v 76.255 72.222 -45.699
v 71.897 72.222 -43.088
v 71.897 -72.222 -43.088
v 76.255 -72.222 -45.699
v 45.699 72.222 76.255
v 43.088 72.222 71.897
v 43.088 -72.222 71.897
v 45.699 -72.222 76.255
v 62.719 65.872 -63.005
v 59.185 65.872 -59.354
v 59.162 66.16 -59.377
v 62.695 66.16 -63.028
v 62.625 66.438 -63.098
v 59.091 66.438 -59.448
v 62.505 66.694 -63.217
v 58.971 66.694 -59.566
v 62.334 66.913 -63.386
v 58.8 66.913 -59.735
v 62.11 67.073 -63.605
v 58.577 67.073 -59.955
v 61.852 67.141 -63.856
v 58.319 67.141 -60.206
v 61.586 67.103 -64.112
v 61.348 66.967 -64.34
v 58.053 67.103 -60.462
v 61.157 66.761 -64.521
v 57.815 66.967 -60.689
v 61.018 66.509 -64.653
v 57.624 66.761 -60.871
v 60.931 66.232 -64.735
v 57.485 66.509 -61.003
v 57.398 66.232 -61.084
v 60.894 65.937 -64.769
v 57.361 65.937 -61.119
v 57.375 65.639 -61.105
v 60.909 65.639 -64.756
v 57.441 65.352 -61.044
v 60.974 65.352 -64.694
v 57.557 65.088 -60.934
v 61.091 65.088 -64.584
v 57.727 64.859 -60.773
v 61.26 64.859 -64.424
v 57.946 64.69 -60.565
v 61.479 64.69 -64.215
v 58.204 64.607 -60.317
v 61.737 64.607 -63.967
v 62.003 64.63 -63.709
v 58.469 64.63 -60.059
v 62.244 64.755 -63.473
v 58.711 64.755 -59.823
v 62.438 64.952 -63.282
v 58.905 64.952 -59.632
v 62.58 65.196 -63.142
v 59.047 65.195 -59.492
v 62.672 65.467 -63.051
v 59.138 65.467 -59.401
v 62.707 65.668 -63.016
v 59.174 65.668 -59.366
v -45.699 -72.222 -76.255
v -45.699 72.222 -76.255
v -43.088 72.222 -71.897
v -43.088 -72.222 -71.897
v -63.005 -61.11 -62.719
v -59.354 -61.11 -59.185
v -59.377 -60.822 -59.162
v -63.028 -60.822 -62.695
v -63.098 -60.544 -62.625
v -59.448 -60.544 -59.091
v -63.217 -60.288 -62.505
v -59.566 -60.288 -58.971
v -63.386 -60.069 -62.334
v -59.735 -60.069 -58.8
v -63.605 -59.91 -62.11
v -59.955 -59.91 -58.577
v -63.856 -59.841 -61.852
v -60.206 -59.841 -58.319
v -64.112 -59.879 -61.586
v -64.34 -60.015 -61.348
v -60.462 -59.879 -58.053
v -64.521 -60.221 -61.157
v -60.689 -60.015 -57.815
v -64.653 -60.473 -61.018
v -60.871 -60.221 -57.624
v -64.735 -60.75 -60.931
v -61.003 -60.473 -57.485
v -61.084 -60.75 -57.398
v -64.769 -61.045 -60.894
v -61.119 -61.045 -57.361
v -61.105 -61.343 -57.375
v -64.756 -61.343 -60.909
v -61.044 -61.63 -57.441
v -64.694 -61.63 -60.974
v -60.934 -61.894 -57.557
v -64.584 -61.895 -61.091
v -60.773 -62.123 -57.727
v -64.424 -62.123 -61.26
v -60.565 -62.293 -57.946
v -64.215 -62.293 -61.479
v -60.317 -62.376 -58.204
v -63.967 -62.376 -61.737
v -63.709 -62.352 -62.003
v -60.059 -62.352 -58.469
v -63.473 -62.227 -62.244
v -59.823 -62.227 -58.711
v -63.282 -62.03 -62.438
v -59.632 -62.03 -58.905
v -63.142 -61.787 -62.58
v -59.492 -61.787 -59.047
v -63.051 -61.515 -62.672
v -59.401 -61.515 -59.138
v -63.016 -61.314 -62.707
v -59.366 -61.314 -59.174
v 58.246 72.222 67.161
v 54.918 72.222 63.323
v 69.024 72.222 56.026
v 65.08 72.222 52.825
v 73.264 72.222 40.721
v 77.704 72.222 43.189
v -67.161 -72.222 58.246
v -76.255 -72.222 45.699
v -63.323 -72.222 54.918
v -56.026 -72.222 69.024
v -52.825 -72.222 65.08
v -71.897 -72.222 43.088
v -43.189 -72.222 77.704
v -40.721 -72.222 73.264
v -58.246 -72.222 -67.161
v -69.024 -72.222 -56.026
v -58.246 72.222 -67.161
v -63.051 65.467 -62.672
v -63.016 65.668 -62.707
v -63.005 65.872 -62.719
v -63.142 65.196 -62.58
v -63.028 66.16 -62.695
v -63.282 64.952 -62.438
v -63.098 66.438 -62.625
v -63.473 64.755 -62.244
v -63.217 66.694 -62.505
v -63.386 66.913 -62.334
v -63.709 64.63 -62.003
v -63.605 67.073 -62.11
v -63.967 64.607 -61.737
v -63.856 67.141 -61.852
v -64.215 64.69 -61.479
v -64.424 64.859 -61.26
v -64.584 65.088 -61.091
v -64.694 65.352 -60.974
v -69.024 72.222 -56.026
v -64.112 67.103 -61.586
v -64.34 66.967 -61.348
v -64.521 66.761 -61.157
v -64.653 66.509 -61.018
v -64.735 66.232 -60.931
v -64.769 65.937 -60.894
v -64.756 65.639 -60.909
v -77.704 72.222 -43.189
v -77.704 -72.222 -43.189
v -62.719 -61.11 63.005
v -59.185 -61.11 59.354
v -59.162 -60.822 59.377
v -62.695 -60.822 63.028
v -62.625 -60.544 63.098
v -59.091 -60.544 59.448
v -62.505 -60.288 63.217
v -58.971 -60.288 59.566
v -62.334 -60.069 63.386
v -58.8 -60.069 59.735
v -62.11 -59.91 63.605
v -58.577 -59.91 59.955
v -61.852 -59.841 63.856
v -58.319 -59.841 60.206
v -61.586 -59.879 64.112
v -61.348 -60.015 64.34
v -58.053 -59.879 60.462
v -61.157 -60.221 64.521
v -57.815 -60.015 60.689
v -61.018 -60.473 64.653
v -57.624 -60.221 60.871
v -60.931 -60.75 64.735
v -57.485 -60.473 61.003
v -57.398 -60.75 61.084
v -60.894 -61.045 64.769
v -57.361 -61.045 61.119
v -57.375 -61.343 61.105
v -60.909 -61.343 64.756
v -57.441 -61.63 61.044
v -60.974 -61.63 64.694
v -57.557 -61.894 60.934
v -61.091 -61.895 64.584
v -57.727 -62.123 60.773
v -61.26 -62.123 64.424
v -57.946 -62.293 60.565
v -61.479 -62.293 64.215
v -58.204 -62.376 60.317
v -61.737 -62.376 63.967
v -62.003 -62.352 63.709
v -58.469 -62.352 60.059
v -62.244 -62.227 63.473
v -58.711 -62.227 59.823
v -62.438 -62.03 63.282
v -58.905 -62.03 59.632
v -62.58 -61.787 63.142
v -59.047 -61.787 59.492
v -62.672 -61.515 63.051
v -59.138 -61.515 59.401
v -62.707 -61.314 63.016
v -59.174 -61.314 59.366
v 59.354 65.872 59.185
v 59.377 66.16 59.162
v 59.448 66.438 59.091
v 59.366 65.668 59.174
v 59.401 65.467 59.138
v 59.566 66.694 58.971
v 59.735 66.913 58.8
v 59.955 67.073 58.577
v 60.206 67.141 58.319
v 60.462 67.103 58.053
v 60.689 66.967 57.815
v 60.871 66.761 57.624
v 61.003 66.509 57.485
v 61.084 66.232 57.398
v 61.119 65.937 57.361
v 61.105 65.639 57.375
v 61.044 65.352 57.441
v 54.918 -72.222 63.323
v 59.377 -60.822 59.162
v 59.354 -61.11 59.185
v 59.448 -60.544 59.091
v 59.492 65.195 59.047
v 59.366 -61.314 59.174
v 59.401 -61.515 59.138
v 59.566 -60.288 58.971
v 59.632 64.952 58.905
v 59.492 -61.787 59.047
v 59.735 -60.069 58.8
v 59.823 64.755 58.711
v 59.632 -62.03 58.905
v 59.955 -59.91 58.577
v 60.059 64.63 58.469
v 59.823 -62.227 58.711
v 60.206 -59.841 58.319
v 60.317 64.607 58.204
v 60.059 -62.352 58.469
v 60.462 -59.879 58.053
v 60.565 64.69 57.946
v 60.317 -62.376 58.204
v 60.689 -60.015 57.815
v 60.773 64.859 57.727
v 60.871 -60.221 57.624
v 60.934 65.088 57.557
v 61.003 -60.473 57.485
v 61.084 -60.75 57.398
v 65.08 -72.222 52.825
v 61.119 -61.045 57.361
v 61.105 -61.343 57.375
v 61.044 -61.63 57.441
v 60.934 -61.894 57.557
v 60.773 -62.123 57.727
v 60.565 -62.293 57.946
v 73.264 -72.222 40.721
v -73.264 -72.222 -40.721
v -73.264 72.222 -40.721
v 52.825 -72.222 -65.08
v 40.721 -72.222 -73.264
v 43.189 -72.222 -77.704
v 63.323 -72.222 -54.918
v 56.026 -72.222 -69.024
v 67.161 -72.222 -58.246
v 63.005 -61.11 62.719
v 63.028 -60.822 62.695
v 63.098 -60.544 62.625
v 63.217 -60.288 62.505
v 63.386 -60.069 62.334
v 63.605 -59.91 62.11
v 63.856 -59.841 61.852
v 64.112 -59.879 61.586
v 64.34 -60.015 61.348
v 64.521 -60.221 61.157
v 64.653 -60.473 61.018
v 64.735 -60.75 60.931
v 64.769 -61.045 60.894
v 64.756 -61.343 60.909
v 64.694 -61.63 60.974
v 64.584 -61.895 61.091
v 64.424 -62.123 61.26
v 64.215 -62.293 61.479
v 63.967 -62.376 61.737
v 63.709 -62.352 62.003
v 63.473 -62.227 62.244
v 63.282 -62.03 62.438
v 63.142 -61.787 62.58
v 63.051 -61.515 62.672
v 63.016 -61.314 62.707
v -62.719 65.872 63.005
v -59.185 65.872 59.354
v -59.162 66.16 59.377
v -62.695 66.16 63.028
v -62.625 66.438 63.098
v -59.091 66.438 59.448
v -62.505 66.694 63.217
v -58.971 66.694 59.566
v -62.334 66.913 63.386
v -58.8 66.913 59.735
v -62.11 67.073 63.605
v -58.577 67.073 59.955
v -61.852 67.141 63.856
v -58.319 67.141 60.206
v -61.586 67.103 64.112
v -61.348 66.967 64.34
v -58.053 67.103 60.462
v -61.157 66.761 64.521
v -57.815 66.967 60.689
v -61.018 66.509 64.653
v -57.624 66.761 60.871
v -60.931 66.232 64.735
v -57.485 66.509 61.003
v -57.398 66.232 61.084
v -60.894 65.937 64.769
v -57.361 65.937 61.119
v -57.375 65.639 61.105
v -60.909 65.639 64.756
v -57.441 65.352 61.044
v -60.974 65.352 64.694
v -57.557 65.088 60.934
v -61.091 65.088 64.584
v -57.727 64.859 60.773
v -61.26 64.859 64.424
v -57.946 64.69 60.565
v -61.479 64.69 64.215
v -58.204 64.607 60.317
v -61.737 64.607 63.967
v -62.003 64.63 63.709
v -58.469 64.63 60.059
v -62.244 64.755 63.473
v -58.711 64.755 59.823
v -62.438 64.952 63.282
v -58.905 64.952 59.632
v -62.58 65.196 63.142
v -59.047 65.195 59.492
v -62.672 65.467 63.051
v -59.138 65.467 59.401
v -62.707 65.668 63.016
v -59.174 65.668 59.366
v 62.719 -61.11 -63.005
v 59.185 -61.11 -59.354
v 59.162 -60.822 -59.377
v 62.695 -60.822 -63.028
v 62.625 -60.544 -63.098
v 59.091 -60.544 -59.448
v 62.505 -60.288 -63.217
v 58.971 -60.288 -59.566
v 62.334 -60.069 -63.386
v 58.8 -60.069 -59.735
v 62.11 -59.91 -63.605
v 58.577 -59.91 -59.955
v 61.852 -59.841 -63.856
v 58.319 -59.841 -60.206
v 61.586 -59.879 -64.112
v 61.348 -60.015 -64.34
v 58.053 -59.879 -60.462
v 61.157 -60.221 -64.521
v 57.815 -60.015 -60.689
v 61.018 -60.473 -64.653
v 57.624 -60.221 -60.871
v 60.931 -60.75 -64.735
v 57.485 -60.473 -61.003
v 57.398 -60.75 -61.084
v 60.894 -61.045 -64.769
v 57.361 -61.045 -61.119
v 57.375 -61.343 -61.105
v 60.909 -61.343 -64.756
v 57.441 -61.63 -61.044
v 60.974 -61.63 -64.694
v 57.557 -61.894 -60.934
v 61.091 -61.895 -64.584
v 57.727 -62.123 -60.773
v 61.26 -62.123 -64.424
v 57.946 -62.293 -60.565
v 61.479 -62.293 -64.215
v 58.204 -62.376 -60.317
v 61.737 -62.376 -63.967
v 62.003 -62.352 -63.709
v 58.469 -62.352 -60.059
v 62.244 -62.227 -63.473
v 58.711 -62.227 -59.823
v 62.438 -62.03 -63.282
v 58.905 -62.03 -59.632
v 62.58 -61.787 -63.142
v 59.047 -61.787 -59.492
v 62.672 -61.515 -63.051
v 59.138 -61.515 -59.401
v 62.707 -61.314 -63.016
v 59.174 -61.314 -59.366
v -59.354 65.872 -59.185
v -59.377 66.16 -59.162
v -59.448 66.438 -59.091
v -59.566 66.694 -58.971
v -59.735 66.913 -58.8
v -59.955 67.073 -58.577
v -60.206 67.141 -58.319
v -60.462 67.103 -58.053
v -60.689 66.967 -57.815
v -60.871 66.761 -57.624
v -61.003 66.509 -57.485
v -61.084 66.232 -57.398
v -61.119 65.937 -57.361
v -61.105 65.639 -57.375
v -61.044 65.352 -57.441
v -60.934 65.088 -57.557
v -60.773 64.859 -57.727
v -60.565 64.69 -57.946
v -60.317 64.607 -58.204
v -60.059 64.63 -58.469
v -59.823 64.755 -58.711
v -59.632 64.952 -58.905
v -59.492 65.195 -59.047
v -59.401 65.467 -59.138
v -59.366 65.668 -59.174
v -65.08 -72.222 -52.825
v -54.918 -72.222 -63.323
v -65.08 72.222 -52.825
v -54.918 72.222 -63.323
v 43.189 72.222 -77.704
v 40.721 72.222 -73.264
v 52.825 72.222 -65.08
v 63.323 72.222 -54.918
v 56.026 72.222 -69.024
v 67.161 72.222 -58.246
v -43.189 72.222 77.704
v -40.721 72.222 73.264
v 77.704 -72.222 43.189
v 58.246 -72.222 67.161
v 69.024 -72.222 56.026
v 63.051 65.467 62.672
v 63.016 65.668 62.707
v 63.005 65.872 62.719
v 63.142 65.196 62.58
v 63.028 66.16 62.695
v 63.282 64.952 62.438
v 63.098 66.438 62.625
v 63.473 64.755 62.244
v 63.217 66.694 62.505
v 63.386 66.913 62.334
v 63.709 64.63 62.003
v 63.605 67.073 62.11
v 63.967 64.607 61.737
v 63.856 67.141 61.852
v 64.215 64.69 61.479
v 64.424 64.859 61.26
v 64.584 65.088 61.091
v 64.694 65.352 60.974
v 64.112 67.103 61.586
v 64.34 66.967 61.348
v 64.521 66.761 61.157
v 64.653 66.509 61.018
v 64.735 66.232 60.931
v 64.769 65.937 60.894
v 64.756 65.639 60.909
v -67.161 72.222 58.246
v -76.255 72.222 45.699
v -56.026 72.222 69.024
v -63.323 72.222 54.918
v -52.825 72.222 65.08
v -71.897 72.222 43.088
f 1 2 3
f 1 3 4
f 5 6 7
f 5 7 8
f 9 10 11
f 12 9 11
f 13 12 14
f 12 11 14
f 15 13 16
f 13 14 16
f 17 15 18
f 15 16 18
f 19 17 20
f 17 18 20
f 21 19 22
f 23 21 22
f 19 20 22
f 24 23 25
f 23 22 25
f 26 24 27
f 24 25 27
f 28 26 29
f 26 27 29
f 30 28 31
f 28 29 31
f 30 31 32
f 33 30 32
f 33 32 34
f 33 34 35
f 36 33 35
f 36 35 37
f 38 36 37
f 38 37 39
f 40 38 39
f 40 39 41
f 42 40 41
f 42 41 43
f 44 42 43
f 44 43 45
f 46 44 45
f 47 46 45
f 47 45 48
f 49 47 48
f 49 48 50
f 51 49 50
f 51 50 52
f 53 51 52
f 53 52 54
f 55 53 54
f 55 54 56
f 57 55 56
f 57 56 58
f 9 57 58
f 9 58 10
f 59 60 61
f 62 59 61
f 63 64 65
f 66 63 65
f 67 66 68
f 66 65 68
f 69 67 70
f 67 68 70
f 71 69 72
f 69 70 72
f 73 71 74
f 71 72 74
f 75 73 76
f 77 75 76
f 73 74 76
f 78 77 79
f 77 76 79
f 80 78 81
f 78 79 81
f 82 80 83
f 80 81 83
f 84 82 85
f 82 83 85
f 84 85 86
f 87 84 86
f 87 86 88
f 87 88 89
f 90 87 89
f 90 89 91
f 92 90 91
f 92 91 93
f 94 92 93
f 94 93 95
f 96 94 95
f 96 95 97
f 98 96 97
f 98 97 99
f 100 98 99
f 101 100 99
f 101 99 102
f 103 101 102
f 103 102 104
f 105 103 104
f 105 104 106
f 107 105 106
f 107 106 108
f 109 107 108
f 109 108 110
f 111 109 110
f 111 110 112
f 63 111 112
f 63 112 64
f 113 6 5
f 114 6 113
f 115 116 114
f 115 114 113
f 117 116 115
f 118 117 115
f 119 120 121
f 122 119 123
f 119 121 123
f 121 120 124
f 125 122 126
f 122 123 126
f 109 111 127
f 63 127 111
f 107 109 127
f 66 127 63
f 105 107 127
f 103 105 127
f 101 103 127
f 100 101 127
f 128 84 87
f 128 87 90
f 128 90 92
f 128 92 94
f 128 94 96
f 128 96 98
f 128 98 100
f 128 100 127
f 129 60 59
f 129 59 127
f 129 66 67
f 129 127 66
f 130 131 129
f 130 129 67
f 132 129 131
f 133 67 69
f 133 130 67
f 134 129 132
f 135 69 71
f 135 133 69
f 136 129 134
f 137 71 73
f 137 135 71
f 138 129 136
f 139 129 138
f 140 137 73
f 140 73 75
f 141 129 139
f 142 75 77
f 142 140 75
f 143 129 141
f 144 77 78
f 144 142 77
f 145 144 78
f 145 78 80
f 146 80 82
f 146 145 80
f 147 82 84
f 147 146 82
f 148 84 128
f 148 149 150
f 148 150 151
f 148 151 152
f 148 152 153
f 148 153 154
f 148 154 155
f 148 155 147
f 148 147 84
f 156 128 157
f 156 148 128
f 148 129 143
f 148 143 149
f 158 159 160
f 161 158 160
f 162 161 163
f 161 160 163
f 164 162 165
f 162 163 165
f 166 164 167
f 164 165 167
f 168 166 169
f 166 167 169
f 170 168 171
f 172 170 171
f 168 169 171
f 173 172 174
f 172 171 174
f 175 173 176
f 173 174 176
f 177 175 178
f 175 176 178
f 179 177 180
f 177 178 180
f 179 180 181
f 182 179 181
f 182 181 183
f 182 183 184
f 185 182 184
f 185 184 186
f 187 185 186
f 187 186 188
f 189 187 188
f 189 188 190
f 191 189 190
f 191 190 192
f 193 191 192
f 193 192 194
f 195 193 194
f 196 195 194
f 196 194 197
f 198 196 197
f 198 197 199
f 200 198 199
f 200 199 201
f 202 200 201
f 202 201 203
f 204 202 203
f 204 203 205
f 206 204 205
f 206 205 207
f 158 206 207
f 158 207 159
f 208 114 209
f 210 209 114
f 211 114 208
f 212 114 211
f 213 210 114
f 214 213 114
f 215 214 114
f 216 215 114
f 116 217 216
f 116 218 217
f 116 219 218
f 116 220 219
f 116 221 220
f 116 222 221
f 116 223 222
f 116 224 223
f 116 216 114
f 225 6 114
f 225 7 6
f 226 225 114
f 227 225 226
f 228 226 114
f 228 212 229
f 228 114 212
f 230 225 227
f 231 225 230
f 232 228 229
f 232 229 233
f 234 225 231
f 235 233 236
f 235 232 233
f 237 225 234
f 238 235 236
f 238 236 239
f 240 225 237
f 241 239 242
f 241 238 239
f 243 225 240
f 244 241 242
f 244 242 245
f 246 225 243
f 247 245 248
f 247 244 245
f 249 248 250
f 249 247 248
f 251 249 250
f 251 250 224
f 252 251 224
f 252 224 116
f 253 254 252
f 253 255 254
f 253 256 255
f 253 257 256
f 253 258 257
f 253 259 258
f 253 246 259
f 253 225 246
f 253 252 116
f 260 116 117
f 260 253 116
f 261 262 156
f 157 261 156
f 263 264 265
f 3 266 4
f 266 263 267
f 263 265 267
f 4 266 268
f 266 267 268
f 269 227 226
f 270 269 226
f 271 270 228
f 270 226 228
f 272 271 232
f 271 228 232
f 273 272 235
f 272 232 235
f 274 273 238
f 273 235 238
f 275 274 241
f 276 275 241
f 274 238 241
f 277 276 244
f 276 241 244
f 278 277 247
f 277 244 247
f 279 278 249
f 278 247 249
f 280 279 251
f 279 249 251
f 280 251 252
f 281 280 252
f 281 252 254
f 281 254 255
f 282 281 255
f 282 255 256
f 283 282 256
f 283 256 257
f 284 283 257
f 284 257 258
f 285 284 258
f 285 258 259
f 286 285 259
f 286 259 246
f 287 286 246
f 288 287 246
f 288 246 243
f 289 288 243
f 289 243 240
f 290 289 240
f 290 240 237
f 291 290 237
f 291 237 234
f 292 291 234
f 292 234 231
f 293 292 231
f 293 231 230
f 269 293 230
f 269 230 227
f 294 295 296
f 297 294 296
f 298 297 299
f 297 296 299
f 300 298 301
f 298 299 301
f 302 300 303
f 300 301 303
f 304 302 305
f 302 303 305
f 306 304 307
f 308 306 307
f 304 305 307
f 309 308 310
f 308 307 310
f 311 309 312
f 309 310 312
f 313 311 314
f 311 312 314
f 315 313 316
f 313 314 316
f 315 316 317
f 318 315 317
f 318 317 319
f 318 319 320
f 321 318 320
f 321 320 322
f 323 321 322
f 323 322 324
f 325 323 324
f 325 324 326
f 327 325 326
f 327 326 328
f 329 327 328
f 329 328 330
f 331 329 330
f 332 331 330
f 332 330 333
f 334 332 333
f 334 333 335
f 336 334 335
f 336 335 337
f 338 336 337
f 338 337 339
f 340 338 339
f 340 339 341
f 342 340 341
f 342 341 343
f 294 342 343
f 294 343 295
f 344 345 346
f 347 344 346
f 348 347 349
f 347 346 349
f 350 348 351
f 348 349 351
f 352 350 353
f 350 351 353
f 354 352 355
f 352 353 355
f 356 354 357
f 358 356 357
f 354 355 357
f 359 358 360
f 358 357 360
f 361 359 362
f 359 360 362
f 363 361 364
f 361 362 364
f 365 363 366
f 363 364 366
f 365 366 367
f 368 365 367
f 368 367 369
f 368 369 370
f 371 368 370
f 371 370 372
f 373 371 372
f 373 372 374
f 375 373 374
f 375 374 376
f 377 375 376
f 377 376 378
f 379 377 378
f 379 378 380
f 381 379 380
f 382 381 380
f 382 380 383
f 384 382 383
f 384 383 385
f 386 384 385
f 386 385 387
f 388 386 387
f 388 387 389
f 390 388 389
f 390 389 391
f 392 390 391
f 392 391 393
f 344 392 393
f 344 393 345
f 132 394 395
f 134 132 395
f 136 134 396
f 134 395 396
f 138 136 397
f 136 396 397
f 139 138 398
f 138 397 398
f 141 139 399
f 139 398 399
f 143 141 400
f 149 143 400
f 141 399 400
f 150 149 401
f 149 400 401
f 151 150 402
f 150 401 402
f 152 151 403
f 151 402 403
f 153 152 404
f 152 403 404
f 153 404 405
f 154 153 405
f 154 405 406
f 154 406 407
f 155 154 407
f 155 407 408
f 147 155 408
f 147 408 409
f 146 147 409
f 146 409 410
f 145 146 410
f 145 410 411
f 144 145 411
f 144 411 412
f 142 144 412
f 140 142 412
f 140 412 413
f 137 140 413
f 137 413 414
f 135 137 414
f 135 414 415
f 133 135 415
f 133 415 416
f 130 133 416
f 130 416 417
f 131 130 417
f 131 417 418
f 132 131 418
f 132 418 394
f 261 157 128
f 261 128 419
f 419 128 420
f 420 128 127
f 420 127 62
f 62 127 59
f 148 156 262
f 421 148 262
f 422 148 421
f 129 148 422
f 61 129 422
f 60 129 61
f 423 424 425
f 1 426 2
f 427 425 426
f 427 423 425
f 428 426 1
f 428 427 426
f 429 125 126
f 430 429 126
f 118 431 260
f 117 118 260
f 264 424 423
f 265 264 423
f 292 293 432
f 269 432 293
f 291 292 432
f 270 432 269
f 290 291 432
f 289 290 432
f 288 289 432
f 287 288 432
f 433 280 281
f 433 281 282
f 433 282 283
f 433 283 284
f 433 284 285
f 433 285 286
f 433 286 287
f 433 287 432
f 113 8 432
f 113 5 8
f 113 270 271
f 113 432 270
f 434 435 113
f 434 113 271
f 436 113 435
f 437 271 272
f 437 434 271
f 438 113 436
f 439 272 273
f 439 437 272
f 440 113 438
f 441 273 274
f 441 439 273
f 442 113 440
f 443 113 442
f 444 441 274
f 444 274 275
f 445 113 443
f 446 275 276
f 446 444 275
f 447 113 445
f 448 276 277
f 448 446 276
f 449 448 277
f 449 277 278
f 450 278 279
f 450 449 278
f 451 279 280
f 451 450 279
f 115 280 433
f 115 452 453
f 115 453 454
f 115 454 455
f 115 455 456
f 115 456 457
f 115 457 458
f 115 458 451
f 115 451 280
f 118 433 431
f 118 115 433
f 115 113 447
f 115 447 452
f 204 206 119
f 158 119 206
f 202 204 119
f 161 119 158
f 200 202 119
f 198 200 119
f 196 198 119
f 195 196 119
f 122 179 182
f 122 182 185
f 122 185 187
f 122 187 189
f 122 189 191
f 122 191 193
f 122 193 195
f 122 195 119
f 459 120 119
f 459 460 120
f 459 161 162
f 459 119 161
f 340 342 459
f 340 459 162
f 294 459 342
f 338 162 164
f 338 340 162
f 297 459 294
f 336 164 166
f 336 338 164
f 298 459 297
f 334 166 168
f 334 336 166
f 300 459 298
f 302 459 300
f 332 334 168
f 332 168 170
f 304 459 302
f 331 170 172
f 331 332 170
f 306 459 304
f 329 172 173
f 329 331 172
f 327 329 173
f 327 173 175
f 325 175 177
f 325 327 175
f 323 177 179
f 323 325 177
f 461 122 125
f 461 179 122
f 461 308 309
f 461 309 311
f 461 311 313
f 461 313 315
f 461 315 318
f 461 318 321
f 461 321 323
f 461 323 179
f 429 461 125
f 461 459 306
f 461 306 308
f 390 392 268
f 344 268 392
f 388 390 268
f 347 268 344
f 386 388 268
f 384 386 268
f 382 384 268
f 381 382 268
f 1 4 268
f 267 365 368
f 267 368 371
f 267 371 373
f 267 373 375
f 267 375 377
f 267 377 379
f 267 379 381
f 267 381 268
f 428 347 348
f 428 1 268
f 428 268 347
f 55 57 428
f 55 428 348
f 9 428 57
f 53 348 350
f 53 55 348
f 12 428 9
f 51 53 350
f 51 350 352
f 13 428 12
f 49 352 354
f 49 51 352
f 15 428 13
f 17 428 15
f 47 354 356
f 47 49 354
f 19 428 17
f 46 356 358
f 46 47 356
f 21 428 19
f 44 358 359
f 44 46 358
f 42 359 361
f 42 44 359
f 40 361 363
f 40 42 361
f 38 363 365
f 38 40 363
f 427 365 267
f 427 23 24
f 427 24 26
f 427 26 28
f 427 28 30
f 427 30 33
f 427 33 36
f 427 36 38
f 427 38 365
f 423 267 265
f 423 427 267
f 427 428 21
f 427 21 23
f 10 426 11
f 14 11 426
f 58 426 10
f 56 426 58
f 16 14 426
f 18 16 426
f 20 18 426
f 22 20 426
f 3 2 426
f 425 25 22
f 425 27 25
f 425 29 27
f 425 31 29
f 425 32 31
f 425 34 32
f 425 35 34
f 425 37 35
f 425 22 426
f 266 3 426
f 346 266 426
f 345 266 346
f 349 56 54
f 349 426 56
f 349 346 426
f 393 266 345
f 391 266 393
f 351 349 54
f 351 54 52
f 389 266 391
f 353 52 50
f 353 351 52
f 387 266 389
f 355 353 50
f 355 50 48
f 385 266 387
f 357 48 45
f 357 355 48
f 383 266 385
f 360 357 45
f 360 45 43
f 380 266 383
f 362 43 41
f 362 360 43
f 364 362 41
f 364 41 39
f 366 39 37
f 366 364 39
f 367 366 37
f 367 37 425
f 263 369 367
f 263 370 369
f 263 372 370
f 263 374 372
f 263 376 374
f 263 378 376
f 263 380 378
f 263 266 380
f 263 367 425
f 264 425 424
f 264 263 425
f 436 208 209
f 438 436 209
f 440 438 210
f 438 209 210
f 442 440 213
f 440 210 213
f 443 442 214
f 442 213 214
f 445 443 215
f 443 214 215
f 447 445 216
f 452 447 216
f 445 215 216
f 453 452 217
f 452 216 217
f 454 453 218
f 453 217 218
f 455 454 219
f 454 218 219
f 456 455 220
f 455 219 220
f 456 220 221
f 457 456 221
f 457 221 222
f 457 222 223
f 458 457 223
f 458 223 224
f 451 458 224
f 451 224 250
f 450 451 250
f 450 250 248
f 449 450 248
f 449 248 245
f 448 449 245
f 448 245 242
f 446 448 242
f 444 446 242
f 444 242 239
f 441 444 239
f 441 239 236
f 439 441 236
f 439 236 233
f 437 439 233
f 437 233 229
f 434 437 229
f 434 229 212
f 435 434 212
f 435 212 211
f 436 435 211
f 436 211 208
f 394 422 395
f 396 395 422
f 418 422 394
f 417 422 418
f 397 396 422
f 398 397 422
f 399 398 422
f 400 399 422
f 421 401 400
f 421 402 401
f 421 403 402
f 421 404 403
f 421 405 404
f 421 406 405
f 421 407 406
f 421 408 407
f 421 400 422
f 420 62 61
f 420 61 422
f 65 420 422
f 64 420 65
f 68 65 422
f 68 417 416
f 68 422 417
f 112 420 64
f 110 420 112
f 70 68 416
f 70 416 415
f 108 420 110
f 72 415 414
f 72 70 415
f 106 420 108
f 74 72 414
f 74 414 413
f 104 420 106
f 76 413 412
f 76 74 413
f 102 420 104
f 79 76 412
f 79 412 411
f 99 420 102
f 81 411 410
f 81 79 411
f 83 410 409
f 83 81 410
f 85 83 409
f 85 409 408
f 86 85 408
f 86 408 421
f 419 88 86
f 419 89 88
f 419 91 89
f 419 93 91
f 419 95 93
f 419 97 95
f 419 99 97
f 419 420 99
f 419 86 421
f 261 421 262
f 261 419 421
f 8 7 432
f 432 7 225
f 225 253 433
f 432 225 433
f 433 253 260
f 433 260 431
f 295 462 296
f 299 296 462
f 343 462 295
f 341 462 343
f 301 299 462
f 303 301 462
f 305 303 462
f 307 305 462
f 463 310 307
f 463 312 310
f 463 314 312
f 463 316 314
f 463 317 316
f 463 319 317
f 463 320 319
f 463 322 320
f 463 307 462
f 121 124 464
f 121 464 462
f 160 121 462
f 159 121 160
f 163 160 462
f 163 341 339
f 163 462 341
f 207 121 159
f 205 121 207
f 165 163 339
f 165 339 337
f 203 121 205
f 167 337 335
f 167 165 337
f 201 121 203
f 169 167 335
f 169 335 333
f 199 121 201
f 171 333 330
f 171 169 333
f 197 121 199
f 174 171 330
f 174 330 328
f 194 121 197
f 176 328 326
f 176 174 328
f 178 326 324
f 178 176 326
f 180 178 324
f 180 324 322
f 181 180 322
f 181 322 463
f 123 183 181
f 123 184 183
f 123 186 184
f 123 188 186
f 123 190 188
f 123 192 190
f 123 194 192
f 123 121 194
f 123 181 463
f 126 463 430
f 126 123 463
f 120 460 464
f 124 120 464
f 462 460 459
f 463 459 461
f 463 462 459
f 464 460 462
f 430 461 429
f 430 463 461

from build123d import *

# Parameters (mm, degrees)
SKETCH2_R               = 88.9
SKETCH2_R_2             = 83.82
BOSS_EXTRUDE1_DEPTH     = 72.22236
CUT_EXTRUDE1_DEPTH      = 73.22236
CUT_EXTRUDE1_DEPTH_BACK = 73.22236
SKETCH5_R               = 1.27
BOLT_HOLES_DEPTH        = 29.911624556
BOLT_PATTERN_COUNT      = 4


with BuildPart() as part:
    # Sketch2 → Boss-Extrude1 (new body, symmetric)
    with BuildSketch(Plane(origin=(0, 0, 0), x_dir=(1, 0, 0), z_dir=(0, 1, 0))):
        Circle(SKETCH2_R)
        Circle(SKETCH2_R_2, mode=Mode.SUBTRACT)
    extrude(amount=BOSS_EXTRUDE1_DEPTH, both=True)

    # Sketch3 → Cut-Extrude1 (cut, two sides)
    with BuildSketch(Plane(origin=(0, 0, 0), x_dir=(1, 0, 0), z_dir=(0, 1, 0))) as cut_extrude1_sk:
        Polygon((169.661755759, -94.300371224), (0, 0), (169.661755759, 101.677593364), align=None)
        Polygon((0, 0), (53.900027233, 96.974944394), (-58.116685864, 96.974944394), align=None)
        Polygon((-123.741299607, 68.777140945), (-123.741299607, -74.157652604), (0, 0), align=None)
        Polygon((-65.840936026, -118.45858783), (0, 0), (70.991745134, -118.45858783), align=None)
    extrude(amount=CUT_EXTRUDE1_DEPTH, mode=Mode.SUBTRACT)
    extrude(cut_extrude1_sk.sketch, amount=-CUT_EXTRUDE1_DEPTH_BACK, mode=Mode.SUBTRACT)

    # Sketch5 → Bolt holes (cut, through all)
    with BuildSketch(Plane(origin=(-56.309218645, 0, 58.175814955), x_dir=(-0.718540152, 0, -0.695485478), z_dir=(0.695485478, 0, -0.718540152))):
        with Locations((-0.02278764, 65.87236)):
            Circle(SKETCH5_R)
        with Locations((-0.02278764, -61.10986)):
            Circle(SKETCH5_R)
    bolt_holes = extrude(amount=-BOLT_HOLES_DEPTH, mode=Mode.SUBTRACT)

    # Bolt pattern: Bolt holes ×4 about axis
    bolt_pattern_axis = Axis((0, 72.22236, 0), (0, 1, 0))
    for i in range(1, BOLT_PATTERN_COUNT):
        add(bolt_holes.rotate(bolt_pattern_axis, i * 360 / BOLT_PATTERN_COUNT), mode=Mode.SUBTRACT)


solid = part.part
